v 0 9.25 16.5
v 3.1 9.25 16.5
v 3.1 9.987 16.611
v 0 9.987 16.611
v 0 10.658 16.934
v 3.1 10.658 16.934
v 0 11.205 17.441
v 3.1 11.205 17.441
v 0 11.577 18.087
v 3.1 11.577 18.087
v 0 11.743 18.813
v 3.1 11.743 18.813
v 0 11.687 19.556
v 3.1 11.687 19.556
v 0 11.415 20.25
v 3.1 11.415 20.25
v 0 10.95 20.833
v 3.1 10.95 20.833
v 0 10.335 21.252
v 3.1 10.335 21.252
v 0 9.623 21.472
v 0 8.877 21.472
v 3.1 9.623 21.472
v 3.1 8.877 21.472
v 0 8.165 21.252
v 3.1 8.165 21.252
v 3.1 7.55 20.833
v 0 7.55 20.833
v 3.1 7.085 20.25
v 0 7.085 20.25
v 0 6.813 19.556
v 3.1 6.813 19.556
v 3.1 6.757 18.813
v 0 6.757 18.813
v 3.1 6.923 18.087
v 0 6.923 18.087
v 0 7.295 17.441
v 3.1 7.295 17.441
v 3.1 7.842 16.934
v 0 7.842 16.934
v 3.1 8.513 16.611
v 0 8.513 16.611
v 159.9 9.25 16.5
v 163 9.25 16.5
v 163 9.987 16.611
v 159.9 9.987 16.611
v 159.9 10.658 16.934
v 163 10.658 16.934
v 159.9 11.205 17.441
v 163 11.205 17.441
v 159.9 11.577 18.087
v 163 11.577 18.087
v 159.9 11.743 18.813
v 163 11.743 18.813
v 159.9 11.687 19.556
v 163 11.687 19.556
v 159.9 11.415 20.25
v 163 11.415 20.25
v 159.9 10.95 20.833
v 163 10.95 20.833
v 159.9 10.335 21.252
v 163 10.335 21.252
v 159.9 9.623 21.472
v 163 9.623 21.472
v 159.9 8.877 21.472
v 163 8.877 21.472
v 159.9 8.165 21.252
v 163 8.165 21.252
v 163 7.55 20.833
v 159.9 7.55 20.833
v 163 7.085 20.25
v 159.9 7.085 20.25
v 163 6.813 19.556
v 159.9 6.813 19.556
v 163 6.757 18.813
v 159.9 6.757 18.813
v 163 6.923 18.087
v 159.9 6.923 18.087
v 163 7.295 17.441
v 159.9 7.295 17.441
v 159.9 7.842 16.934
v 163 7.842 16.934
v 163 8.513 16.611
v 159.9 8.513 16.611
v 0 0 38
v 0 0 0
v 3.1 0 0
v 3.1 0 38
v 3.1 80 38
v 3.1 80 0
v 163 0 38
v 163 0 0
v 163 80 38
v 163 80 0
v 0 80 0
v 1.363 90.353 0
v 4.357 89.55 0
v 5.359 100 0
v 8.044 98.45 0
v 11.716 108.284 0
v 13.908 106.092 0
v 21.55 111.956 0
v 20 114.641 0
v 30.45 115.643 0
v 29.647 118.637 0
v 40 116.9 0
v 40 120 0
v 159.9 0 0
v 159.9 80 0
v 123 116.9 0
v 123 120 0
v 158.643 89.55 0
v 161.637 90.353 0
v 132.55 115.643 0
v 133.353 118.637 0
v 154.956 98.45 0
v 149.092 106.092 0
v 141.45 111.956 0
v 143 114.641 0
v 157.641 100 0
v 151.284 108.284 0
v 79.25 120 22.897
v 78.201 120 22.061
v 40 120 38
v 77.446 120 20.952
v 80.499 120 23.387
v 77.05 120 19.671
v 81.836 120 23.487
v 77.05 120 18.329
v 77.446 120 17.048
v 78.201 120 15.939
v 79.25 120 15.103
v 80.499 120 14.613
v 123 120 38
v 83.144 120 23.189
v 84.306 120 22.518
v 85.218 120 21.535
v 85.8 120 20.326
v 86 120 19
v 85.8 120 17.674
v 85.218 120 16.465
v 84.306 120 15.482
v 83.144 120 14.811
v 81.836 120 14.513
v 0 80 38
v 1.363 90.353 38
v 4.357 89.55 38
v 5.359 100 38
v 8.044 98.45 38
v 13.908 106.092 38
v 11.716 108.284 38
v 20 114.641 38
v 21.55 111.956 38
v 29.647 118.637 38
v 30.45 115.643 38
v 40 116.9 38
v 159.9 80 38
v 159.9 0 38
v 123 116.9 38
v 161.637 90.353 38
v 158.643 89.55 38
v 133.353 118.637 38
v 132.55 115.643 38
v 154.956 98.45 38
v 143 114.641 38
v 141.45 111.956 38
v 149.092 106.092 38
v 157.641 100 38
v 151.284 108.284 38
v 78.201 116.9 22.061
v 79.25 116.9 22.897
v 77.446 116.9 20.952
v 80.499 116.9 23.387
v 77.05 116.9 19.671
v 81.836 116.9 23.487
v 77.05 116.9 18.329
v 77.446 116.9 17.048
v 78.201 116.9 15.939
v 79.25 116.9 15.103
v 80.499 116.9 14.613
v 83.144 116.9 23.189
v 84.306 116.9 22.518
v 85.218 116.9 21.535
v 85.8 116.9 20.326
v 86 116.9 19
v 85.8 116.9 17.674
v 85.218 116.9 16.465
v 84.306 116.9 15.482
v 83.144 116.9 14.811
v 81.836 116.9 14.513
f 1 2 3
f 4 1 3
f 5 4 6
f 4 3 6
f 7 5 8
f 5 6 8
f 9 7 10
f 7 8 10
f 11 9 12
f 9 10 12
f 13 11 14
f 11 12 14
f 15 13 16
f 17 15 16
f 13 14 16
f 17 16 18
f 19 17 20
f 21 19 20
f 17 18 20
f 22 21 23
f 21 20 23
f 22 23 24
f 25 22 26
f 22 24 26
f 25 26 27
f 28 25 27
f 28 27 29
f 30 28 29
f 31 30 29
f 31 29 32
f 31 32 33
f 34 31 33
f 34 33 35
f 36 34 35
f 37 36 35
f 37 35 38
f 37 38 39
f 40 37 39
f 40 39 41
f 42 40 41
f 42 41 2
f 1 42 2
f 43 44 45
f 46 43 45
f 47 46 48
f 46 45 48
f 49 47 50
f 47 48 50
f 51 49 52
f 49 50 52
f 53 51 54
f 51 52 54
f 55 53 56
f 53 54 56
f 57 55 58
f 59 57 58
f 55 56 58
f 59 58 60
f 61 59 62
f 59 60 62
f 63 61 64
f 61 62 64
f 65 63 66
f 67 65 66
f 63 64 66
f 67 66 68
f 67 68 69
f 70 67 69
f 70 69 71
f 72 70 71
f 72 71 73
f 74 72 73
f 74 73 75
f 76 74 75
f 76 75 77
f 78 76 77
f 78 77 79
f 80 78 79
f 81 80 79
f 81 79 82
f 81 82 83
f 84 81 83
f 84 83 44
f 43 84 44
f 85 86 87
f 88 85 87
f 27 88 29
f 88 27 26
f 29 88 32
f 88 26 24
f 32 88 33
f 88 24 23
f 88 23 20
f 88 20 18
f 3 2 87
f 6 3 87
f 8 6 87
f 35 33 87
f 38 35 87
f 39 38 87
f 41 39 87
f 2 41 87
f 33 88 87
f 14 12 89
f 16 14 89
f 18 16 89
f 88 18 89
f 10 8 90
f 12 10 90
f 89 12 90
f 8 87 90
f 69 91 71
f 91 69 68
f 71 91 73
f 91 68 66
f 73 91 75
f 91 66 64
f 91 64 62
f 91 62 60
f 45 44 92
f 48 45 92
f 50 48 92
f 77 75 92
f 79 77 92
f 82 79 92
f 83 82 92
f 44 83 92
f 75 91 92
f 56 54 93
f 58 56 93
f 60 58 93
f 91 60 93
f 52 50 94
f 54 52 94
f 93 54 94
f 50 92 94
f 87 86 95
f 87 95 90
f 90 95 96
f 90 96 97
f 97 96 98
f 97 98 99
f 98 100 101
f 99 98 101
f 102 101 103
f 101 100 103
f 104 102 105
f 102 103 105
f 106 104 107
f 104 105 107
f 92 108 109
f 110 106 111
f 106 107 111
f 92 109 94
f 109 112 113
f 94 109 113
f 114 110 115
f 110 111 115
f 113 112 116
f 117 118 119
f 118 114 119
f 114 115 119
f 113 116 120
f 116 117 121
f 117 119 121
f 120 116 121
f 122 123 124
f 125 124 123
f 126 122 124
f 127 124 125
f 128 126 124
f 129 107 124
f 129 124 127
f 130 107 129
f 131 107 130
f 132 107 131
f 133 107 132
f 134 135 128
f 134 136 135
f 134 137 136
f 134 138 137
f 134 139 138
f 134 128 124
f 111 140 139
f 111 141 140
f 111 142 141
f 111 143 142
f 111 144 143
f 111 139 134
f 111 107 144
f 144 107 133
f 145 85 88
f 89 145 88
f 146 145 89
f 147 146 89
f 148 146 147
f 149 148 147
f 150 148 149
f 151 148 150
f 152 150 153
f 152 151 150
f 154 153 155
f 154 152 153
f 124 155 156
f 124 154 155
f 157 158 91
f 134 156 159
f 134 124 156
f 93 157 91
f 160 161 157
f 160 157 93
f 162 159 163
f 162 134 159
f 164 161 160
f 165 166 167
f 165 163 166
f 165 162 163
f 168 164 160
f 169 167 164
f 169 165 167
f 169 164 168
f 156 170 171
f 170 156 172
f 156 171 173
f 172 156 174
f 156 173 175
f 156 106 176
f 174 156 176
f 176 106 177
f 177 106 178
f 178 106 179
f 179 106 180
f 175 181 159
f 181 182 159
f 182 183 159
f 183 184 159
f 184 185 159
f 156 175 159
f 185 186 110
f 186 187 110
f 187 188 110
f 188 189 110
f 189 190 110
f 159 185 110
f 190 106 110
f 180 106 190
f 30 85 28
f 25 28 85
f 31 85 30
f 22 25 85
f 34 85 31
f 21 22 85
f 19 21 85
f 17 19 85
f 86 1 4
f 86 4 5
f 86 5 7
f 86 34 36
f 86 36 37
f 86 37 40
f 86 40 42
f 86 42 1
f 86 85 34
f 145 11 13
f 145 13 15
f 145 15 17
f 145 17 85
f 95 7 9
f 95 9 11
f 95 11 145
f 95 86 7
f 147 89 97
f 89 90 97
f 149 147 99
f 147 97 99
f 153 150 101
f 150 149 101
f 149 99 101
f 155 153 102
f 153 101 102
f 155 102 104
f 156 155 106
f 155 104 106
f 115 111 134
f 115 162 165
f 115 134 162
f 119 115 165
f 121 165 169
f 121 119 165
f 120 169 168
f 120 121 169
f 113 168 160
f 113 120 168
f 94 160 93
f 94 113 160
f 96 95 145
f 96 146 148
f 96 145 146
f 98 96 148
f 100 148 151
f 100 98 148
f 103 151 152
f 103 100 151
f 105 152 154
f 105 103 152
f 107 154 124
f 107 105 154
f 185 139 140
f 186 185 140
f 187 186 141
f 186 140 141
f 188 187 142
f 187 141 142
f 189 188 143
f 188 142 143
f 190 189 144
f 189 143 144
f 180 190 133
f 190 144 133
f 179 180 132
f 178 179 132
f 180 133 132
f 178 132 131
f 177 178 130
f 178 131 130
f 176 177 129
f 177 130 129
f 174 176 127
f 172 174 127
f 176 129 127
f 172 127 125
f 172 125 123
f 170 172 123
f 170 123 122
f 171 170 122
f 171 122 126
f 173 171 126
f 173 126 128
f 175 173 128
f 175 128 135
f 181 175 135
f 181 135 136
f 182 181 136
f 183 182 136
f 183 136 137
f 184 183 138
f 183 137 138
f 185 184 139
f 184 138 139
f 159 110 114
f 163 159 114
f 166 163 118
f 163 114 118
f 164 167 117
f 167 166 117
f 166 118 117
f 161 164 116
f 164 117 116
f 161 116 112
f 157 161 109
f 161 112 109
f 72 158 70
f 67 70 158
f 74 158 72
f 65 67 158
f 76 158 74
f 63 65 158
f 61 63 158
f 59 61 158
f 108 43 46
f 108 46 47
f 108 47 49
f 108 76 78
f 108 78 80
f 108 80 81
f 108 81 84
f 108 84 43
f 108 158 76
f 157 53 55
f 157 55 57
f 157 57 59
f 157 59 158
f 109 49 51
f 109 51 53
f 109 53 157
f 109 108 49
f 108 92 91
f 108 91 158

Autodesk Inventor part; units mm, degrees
ref_plane "YZ Plane" through (0, 0, 0) normal (1, 0, 0) x (0, 1, 0)
ref_plane "XZ Plane" through (0, 0, 0) normal (0, 1, 0) x (-1, 0, 0)
ref_plane "XY Plane" through (0, 0, 0) normal (0, 0, 1) x (1, 0, 0)
sketch "Sketch1" plane through (0, 0, 0) normal (0, 0, 1) x (1, 0, 0)
  line L0 (0, 0) -> (0, 80)
  line L1 (163, 0) -> (163, 80)
  line L2 (0, 0) -> (3.1, 0)
  line L3 (3.1, 0) -> (3.1, 80)
  line L4 (163, 0) -> (159.9, 0)
  line L5 (159.9, 0) -> (159.9, 80)
  arc A0 (40, 116.9) -> (3.1, 80) centre (40, 80) ccw
  arc A1 (159.9, 80) -> (123, 116.9) centre (123, 80) ccw
  line L6 (40, 116.9) -> (123, 116.9)
  arc A2 (40, 120) -> (0, 80) centre (40, 80) ccw
  line L7 (40, 120) -> (123, 120)
  arc A3 (163, 80) -> (123, 120) centre (123, 80) ccw
  dimension "d0" = 163
  dimension "d1" = 80
  dimension "d2" = 3.1
  dimension "d3" = 3.1
  dimension "d4" = 3.1
  dimension "d5" = 120
extrude "Extrusion1" add sketch "Sketch1" along normal blind 38
sketch "Sketch2" plane through (163, 0, 0) normal (1, 0, 0) x (0, 0, -1)
  circle A0 centre (-19, 9.25) radius 2.5
  line L0 (-38, 0) -> (-38, 80) projected
  line L1 (0, 0) -> (-38, 0) projected
  dimension "d8" = 5
  dimension "d9" = 19
  dimension "d10" = 9.25
extrude "Extrusion2" cut sketch "Sketch2" against normal through all
sketch "Sketch3" plane through (40, 120, 0) normal (0, 1, 0) x (1, 0, 0)
  circle A0 centre (41.5, -19) radius 4.5
  line L0 (-40, 0) -> (-40, -38) projected
  line L1 (83, 0) -> (0, 0) projected
  point P0 (-40, -19)
  dimension "d13" = 81.5
  dimension "d14" = 19
  dimension "d15" = 9
extrude "Extrusion3" cut sketch "Sketch3" against normal up to surface (3.1 mm away)
properties part number "pulley_bracket"
